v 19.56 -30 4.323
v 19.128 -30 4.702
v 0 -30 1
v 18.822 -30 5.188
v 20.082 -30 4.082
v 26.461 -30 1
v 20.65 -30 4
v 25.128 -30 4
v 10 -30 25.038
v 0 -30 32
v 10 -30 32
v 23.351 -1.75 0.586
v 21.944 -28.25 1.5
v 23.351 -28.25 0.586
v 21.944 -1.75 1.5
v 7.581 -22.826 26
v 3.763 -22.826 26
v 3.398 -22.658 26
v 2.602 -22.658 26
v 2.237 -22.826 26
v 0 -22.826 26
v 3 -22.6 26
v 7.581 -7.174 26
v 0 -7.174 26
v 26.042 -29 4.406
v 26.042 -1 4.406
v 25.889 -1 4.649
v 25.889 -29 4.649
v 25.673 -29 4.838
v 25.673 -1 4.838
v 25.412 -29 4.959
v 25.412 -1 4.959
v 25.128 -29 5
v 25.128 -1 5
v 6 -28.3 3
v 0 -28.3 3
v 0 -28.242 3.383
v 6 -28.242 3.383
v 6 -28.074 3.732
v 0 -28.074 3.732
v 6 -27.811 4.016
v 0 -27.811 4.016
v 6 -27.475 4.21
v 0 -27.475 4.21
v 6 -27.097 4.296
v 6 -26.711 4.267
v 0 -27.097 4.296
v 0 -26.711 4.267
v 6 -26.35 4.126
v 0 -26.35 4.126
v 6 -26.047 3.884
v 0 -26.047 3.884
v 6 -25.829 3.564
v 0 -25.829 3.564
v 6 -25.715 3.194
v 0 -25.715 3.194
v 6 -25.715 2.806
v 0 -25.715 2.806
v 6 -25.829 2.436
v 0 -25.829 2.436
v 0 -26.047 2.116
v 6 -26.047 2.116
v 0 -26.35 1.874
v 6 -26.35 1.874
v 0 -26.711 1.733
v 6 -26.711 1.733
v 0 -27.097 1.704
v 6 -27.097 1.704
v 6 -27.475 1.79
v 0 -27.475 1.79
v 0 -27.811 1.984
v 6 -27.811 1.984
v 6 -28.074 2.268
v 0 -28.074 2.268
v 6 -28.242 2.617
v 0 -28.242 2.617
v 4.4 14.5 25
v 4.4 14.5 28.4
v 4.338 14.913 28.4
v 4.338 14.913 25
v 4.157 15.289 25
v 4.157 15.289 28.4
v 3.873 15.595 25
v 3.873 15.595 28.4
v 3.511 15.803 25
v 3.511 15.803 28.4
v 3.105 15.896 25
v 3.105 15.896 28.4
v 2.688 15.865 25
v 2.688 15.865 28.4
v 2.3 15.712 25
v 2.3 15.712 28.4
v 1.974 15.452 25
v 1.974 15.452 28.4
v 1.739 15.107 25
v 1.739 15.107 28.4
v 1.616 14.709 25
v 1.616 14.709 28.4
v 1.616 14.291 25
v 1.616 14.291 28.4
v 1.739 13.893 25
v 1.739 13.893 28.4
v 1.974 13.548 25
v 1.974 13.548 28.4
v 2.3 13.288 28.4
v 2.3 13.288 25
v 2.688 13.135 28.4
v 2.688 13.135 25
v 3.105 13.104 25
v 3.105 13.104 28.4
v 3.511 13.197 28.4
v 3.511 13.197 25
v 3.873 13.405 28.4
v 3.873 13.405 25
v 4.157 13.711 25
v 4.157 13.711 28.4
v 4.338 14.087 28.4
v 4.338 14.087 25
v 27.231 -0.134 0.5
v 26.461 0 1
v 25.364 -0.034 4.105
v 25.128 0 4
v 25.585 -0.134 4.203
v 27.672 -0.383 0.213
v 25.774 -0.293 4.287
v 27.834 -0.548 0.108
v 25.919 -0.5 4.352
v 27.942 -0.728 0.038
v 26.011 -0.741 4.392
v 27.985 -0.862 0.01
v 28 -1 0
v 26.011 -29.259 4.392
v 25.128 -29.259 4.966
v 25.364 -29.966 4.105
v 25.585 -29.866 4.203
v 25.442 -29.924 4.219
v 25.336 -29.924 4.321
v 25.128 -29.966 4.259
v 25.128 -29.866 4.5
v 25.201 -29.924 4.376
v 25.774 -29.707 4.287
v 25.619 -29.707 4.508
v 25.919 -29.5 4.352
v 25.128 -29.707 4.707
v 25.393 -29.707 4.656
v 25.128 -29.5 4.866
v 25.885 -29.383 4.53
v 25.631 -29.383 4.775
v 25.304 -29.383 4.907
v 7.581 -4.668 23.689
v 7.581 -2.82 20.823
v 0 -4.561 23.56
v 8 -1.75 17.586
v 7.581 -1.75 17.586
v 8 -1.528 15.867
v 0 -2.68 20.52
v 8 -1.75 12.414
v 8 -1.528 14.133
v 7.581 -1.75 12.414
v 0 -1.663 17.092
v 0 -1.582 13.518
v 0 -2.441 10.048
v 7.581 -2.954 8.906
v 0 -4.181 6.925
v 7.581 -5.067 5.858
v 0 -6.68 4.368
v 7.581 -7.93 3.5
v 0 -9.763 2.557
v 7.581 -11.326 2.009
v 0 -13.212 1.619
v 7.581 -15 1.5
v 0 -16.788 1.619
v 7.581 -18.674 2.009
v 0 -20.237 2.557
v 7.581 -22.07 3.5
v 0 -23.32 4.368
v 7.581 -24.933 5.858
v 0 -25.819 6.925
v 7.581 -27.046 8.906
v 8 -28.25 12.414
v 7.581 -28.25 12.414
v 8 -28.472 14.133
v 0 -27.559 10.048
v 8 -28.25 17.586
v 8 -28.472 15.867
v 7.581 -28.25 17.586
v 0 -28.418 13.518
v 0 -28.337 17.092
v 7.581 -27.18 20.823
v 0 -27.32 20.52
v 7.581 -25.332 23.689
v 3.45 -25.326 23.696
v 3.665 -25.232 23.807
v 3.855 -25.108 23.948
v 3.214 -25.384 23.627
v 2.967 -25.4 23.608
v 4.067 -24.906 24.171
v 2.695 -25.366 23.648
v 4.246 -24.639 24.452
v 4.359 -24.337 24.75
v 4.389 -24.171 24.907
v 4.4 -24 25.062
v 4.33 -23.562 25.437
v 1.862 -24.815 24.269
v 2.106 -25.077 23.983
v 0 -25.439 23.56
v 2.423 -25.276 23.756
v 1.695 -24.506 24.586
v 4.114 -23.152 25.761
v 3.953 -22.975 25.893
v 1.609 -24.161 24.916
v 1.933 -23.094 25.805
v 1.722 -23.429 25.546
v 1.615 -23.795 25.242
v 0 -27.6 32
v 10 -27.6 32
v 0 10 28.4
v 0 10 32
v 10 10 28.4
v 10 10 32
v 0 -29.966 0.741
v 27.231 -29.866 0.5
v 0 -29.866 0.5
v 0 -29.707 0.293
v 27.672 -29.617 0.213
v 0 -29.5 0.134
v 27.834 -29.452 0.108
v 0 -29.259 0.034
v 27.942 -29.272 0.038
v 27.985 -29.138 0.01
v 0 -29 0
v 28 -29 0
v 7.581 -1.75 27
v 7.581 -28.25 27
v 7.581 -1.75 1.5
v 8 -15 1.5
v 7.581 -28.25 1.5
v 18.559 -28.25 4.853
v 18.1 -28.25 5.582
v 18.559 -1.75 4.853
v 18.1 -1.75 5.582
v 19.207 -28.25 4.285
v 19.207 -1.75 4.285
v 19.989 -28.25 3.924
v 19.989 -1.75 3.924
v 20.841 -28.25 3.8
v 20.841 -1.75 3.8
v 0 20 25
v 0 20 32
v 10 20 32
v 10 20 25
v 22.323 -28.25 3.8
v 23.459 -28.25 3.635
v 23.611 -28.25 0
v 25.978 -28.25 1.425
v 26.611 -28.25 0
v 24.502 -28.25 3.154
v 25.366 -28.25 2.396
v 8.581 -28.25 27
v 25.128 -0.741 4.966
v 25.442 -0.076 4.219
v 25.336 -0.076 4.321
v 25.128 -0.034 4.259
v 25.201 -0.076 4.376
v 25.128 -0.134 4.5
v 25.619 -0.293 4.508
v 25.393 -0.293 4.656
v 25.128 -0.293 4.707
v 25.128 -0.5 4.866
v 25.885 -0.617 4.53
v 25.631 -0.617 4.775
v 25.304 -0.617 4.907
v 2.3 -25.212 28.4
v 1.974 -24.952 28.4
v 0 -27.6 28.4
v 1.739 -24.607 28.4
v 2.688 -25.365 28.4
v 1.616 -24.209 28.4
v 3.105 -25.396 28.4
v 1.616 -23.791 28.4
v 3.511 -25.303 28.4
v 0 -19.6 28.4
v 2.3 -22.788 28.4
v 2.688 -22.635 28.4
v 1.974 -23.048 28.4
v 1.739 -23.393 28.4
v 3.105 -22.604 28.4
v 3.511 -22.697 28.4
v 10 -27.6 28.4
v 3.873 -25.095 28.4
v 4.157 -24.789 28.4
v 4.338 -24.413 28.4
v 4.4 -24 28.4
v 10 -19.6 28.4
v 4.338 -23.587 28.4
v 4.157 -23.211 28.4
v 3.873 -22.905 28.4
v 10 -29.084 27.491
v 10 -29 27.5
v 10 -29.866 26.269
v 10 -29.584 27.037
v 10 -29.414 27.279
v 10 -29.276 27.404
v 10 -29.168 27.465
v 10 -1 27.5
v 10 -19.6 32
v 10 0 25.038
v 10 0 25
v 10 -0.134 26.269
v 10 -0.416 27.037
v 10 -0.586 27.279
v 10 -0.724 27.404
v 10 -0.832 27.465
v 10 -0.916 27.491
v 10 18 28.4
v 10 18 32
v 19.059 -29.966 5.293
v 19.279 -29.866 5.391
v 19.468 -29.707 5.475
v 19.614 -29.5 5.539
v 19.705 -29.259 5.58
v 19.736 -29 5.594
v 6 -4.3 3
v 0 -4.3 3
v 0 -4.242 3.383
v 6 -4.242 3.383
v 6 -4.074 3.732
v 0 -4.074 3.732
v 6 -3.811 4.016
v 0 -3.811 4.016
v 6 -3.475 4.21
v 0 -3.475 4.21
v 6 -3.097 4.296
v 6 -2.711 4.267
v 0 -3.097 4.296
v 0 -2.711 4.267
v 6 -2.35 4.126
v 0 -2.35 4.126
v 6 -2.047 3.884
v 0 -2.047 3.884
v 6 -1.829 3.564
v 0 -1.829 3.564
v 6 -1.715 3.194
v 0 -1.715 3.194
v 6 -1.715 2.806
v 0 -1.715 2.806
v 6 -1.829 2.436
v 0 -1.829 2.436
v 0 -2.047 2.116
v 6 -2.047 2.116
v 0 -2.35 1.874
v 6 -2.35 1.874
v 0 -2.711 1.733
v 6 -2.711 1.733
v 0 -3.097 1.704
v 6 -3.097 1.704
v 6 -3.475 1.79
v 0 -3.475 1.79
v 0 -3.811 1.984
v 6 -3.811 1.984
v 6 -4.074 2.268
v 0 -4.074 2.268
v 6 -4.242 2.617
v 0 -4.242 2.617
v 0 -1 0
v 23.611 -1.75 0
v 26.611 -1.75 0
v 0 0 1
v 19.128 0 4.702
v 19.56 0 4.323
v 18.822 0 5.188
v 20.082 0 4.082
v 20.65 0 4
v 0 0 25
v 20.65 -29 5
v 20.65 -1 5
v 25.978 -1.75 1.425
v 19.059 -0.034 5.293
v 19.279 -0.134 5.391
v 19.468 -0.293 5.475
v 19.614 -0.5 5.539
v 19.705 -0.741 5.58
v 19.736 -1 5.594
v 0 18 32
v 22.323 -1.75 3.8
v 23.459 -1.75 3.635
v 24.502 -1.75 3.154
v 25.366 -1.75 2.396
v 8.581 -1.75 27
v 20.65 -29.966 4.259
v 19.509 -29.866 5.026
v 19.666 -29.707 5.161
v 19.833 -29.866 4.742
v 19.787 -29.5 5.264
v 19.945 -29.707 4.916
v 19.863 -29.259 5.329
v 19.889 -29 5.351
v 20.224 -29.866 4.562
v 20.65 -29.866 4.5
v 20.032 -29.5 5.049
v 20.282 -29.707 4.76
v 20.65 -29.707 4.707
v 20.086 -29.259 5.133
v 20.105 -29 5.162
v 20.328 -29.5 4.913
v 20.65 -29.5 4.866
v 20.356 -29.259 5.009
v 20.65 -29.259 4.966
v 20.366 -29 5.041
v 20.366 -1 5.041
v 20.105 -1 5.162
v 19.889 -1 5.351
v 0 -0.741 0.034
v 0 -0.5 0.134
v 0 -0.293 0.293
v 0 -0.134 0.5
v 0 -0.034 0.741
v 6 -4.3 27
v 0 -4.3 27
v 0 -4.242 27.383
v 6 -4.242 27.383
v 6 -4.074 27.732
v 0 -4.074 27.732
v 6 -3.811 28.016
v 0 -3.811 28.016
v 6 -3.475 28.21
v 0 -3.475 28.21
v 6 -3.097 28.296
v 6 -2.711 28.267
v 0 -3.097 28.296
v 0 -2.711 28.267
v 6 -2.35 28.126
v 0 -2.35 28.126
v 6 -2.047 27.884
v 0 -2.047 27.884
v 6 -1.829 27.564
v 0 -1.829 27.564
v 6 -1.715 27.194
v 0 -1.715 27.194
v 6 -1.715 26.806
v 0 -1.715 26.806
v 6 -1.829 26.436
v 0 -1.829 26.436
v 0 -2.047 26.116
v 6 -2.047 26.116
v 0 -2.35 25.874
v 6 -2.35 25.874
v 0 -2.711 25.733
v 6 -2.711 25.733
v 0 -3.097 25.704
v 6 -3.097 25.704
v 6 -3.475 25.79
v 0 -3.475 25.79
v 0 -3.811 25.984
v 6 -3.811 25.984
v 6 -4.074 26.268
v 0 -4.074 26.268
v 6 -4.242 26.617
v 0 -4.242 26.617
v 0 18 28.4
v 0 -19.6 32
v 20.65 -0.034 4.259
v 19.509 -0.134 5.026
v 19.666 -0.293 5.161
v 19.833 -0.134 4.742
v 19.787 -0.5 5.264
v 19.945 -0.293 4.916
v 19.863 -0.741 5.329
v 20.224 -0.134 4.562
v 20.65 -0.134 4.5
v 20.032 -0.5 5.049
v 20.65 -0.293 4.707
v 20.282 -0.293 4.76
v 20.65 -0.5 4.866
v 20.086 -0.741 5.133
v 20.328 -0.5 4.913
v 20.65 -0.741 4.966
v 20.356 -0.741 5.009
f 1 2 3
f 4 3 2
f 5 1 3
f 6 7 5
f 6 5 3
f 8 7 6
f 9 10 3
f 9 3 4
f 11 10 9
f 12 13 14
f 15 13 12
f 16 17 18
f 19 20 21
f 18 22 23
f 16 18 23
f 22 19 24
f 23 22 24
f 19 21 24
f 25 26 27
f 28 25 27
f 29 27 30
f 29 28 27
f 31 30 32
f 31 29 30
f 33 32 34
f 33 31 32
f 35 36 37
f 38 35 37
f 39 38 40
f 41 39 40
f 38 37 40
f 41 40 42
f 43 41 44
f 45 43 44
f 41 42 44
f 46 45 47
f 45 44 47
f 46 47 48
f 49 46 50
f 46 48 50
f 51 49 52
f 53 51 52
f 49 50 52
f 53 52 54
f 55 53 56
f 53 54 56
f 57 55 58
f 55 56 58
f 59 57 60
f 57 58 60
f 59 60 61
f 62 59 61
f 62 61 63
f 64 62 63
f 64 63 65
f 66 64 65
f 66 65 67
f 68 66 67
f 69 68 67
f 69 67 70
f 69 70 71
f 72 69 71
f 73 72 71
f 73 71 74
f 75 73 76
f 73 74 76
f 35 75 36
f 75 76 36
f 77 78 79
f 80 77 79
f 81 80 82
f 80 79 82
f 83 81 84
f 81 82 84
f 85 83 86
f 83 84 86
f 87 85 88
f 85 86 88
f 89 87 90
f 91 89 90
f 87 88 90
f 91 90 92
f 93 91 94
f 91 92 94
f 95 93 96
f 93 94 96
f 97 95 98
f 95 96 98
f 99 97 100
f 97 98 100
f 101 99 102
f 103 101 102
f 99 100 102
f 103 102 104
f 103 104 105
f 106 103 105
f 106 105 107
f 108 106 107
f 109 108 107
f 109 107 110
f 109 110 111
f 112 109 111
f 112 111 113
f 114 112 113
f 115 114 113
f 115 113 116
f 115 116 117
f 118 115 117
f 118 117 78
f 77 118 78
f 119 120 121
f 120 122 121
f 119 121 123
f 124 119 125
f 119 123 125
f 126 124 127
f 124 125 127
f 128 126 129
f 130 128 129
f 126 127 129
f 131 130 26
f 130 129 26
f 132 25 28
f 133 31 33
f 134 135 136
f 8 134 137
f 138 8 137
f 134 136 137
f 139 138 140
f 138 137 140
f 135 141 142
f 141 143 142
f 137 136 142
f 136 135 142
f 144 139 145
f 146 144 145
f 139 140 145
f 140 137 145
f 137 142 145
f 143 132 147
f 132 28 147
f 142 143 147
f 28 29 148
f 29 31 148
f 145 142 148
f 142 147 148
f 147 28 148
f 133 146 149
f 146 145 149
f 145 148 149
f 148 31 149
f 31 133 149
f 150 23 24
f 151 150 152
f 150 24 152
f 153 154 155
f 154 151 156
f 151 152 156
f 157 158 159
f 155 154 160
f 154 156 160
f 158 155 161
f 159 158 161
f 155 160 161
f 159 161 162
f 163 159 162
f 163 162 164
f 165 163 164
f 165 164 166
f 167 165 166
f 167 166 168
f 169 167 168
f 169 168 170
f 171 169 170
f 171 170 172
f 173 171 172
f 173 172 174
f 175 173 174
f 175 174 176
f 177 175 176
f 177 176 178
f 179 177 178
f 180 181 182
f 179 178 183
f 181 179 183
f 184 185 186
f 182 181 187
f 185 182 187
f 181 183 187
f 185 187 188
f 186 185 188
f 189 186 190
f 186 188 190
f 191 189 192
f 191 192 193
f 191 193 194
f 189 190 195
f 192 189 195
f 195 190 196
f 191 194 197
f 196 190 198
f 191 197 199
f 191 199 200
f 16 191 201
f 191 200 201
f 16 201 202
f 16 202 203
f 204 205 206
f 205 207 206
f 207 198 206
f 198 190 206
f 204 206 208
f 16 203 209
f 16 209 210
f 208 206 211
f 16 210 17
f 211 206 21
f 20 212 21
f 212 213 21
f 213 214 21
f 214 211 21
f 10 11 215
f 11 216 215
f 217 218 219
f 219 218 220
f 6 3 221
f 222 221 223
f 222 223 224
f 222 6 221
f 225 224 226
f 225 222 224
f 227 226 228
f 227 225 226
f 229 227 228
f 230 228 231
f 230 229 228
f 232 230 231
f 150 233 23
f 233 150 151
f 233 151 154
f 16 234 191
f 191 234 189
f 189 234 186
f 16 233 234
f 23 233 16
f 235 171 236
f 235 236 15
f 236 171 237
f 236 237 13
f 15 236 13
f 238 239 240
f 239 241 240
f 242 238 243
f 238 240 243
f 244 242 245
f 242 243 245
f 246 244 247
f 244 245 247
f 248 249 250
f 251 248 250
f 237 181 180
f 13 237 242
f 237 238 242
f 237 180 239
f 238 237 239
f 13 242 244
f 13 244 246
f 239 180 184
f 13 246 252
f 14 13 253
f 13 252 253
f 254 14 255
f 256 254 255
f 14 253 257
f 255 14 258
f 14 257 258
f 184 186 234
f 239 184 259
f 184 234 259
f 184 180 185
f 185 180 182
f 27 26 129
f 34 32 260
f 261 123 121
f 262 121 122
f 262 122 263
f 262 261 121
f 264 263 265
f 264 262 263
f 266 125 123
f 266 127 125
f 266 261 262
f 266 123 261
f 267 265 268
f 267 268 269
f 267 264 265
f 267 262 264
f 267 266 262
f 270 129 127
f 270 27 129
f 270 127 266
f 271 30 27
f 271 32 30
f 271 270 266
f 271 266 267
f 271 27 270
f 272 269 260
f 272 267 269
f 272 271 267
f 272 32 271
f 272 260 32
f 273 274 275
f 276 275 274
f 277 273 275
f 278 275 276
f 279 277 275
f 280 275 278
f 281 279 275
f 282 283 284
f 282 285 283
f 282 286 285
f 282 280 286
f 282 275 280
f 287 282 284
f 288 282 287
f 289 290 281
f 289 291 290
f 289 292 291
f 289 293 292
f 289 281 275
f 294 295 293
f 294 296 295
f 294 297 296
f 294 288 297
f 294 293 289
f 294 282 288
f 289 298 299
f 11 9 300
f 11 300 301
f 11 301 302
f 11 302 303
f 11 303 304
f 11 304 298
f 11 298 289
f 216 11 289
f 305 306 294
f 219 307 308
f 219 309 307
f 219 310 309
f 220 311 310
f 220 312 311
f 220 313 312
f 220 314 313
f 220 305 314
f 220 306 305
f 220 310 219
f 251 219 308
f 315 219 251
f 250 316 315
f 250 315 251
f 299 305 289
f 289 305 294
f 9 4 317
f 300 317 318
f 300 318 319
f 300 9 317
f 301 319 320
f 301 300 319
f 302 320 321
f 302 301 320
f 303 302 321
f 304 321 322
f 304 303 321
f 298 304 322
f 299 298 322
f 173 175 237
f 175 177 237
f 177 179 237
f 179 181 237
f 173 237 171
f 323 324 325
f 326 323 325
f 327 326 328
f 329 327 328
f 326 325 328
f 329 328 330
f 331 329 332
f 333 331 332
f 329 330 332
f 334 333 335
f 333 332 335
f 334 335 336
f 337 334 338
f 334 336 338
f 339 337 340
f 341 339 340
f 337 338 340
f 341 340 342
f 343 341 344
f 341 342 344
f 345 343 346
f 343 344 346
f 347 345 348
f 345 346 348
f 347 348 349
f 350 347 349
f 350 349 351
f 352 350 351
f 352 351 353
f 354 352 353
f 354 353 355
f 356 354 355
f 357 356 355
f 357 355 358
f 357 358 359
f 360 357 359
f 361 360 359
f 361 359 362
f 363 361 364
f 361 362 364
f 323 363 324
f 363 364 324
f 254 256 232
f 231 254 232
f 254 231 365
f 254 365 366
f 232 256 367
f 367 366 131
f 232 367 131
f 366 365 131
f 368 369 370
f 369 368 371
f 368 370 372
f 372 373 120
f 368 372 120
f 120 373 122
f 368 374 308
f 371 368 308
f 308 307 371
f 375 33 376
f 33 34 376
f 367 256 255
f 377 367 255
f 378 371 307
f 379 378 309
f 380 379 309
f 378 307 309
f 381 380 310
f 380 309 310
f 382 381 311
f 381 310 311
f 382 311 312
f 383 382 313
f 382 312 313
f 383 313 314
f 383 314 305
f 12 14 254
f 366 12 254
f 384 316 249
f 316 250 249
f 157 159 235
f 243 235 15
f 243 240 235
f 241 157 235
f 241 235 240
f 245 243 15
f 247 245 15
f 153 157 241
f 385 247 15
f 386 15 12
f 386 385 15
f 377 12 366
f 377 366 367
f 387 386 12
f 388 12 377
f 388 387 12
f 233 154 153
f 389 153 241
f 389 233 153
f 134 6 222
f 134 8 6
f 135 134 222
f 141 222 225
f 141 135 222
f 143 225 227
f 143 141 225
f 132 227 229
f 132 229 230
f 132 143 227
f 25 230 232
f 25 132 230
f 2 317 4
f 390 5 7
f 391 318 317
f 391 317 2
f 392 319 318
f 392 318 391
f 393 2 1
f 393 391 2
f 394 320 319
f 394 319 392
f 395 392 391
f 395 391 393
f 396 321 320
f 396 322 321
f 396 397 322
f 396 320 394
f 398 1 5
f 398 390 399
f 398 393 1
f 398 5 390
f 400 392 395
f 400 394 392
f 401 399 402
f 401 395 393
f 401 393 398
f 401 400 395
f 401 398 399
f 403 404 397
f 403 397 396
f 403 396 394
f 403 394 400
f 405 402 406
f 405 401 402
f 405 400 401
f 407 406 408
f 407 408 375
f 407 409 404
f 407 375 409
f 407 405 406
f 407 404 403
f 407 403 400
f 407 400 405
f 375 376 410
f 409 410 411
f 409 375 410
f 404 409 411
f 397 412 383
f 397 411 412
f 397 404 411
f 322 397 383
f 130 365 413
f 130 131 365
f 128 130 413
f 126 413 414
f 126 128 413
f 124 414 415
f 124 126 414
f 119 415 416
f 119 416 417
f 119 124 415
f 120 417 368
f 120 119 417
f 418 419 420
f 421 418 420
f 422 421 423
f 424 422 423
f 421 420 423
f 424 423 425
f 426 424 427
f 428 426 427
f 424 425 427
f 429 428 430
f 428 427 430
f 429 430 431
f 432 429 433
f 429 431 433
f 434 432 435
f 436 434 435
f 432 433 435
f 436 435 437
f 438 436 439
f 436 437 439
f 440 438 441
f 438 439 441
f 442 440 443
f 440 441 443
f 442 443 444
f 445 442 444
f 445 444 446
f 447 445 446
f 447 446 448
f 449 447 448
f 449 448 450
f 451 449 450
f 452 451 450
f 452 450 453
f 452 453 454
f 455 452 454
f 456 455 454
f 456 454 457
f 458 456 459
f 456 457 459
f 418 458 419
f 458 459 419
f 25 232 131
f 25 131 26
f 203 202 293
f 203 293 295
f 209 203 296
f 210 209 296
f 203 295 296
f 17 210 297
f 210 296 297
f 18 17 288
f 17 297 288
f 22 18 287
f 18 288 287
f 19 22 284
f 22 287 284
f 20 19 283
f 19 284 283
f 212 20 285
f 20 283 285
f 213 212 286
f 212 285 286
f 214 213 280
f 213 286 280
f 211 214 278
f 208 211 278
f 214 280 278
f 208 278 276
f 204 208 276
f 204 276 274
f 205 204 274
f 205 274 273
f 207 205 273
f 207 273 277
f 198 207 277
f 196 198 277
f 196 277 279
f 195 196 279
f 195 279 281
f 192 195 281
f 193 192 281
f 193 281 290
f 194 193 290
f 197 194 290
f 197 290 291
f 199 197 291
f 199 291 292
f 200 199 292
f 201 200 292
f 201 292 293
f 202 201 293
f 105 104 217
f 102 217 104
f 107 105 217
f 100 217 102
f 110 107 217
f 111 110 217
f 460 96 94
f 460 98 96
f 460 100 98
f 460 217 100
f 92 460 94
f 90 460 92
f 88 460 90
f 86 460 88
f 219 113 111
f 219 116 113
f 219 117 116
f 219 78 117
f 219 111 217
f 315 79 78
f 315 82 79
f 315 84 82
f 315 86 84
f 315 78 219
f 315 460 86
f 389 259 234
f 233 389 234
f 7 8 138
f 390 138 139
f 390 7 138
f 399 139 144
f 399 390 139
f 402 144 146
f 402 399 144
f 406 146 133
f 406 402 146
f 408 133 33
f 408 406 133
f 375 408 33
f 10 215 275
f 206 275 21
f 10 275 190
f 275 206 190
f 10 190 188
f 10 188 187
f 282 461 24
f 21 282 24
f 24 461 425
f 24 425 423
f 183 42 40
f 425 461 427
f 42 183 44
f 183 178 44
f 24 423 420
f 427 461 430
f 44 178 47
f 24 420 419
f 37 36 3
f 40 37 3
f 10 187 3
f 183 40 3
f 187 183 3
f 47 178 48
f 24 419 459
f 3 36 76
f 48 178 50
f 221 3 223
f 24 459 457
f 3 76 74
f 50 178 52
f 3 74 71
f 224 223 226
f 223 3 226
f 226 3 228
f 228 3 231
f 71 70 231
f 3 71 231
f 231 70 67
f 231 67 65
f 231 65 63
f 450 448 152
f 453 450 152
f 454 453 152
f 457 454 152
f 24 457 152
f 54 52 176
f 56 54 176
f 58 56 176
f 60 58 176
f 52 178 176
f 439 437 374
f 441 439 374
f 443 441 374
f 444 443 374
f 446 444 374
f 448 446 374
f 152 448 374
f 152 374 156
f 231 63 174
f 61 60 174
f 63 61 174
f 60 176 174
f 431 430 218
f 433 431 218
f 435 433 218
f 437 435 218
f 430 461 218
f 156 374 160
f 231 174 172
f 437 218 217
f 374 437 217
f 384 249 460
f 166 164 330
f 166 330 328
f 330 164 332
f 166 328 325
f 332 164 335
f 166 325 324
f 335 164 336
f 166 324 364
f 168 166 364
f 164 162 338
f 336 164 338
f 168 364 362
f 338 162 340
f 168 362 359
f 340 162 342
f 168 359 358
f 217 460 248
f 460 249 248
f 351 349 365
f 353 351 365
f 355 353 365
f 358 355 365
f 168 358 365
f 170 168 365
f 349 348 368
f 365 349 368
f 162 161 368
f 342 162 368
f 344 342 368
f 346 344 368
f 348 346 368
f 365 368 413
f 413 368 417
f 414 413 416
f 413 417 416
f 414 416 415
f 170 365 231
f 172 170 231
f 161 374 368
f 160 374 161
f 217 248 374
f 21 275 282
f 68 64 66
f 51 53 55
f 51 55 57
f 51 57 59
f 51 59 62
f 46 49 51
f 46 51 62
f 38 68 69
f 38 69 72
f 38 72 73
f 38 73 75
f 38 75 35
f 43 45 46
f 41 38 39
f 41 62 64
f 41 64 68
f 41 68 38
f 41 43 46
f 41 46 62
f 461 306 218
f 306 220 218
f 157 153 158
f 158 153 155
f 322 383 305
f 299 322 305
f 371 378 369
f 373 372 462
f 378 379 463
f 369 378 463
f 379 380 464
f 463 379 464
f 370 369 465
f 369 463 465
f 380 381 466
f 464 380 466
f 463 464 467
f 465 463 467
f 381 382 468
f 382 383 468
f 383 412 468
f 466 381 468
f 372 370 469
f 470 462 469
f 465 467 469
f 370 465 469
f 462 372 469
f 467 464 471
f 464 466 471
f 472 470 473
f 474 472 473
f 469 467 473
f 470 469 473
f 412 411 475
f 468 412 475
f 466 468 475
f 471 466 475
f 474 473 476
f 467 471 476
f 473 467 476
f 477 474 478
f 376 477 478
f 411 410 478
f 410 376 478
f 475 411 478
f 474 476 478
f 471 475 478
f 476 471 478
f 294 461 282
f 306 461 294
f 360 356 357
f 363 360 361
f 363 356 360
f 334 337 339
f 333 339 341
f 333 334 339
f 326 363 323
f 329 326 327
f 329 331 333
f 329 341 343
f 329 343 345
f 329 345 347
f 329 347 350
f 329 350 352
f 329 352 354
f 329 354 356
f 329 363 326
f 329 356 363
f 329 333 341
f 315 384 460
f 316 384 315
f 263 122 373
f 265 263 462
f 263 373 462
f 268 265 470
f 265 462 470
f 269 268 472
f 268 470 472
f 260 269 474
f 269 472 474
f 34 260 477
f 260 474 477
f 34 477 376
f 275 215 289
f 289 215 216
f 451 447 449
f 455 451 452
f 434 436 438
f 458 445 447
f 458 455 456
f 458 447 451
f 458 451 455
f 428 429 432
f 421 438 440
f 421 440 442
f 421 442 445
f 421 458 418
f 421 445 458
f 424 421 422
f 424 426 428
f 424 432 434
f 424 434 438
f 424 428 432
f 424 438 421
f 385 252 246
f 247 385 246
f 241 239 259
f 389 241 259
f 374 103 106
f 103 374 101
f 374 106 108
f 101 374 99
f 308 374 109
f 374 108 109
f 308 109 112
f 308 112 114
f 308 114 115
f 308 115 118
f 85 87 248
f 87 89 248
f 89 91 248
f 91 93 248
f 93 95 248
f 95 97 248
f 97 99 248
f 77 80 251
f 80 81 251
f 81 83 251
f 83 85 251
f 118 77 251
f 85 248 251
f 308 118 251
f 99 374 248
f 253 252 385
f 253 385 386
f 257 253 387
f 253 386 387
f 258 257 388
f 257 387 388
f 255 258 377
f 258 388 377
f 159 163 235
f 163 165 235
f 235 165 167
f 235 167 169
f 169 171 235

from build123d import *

# Parameters (mm, degrees)
F1_DEPTH  = 30
F2_W      = 10
F2_H      = 50
F3_DEPTH  = 7
F4_W      = 10
F4_H      = 8
F5_DEPTH  = 3.6
F8_DEPTH  = 26.5
F10_DEPTH = 8
F11_R     = 1.3
F12_DEPTH = 6
F13_R     = 1
F14_R     = 1.4
F16_DEPTH = 5
F15_R     = 1.4
F17_DEPTH = 5
F18_R     = 3
F19_R     = 4
F20_SIZE  = 1


with BuildPart() as f1:
    # F0 (on Front) → F1 (new body)
    with BuildSketch(Plane.XZ):
        Polygon((0, 32), (0, 0), (28, 0), (25.777778, 5), (20, 5), (8, 32), align=None)
    extrude(amount=F1_DEPTH)

    # F2 (on face) → F3 (join)
    with BuildSketch(Plane.XY.offset(32)):
        with Locations((5, -5)):
            Rectangle(F2_W, F2_H)
    extrude(amount=-F3_DEPTH)

    # F4 (on face) → F5 (cut)
    with BuildSketch(Plane.XY.offset(32)):
        with Locations((5, 14)):
            Rectangle(F4_W, F4_H)
        with Locations((5, -23.6)):
            Rectangle(F4_W, F4_H)
    extrude(amount=-F5_DEPTH, mode=Mode.SUBTRACT)

    # F7 (on offset) → F8 (cut)
    with BuildSketch(Plane.XZ.offset(28.25)):
        Polygon((18.891857, 3.8), (8.580746, 27), (7.580746, 27), (7.580746, 1.5), (22.944444, 1.5), (24.5, -2), (27.5, -2), (24.922222, 3.8), align=None)
    extrude(amount=-F8_DEPTH, mode=Mode.SUBTRACT)

    # F9 (on face) → F10 (cut)
    with BuildSketch(Plane(origin=(0, 0, 0), x_dir=(0, -1, 0), z_dir=(-1, 0, 0))):
        with BuildLine():
            Line((22.826238, 26), (7.173762, 26))
            ThreePointArc((7.173762, 26), (15, 1.5), (22.826238, 26))
        make_face()
    extrude(amount=-F10_DEPTH, mode=Mode.SUBTRACT)

    # F11 (on face) → F12 (cut)
    with BuildSketch(Plane(origin=(0, 0, 0), x_dir=(0, -1, 0), z_dir=(-1, 0, 0))):
        with Locations((3, 27)):
            Circle(F11_R)
        with Locations((3, 3)):
            Circle(F11_R)
        with Locations((27, 3)):
            Circle(F11_R)
    extrude(amount=-F12_DEPTH, mode=Mode.SUBTRACT)

    # F13
    f13_edges = [f1.edges().sort_by_distance(p)[0] for p in [
        (15, -30, 16.25),
        (15, 0, 16.25),
        (26.888889, -30, 2.5),
        (22.888889, -30, 5),
        (26.888889, 0, 2.5),
        (22.888889, 0, 5),
        (25.777778, -15, 5),
        (20, -15, 5),
        (14, -30, 0),
        (14, 0, 0),
    ]]
    fillet(f13_edges, radius=F13_R)

    # F14 (on face) → F16 (cut)
    with BuildSketch(Plane.XY.offset(28.4)):
        with Locations((3, 14.5)):
            Circle(F14_R)
    extrude(amount=-F16_DEPTH, mode=Mode.SUBTRACT)

    # F15 (on face) → F17 (cut)
    with BuildSketch(Plane.XY.offset(28.4)):
        with Locations((3, -24)):
            Circle(F15_R)
    extrude(amount=-F17_DEPTH, mode=Mode.SUBTRACT)

    # F18
    f18_edges = [f1.edges().sort_by_distance(p)[0] for p in [
        (18.891857, -15, 3.8),
    ]]
    fillet(f18_edges, radius=F18_R)

    # F19
    f19_edges = [f1.edges().sort_by_distance(p)[0] for p in [
        (24.922222, -15, 3.8),
    ]]
    fillet(f19_edges, radius=F19_R)

    # F20
    f20_edges = [f1.edges().sort_by_distance(p)[0] for p in [
        (22.944444, -15, 1.5),
    ]]
    chamfer(f20_edges, length=F20_SIZE)


solid = f1.part
